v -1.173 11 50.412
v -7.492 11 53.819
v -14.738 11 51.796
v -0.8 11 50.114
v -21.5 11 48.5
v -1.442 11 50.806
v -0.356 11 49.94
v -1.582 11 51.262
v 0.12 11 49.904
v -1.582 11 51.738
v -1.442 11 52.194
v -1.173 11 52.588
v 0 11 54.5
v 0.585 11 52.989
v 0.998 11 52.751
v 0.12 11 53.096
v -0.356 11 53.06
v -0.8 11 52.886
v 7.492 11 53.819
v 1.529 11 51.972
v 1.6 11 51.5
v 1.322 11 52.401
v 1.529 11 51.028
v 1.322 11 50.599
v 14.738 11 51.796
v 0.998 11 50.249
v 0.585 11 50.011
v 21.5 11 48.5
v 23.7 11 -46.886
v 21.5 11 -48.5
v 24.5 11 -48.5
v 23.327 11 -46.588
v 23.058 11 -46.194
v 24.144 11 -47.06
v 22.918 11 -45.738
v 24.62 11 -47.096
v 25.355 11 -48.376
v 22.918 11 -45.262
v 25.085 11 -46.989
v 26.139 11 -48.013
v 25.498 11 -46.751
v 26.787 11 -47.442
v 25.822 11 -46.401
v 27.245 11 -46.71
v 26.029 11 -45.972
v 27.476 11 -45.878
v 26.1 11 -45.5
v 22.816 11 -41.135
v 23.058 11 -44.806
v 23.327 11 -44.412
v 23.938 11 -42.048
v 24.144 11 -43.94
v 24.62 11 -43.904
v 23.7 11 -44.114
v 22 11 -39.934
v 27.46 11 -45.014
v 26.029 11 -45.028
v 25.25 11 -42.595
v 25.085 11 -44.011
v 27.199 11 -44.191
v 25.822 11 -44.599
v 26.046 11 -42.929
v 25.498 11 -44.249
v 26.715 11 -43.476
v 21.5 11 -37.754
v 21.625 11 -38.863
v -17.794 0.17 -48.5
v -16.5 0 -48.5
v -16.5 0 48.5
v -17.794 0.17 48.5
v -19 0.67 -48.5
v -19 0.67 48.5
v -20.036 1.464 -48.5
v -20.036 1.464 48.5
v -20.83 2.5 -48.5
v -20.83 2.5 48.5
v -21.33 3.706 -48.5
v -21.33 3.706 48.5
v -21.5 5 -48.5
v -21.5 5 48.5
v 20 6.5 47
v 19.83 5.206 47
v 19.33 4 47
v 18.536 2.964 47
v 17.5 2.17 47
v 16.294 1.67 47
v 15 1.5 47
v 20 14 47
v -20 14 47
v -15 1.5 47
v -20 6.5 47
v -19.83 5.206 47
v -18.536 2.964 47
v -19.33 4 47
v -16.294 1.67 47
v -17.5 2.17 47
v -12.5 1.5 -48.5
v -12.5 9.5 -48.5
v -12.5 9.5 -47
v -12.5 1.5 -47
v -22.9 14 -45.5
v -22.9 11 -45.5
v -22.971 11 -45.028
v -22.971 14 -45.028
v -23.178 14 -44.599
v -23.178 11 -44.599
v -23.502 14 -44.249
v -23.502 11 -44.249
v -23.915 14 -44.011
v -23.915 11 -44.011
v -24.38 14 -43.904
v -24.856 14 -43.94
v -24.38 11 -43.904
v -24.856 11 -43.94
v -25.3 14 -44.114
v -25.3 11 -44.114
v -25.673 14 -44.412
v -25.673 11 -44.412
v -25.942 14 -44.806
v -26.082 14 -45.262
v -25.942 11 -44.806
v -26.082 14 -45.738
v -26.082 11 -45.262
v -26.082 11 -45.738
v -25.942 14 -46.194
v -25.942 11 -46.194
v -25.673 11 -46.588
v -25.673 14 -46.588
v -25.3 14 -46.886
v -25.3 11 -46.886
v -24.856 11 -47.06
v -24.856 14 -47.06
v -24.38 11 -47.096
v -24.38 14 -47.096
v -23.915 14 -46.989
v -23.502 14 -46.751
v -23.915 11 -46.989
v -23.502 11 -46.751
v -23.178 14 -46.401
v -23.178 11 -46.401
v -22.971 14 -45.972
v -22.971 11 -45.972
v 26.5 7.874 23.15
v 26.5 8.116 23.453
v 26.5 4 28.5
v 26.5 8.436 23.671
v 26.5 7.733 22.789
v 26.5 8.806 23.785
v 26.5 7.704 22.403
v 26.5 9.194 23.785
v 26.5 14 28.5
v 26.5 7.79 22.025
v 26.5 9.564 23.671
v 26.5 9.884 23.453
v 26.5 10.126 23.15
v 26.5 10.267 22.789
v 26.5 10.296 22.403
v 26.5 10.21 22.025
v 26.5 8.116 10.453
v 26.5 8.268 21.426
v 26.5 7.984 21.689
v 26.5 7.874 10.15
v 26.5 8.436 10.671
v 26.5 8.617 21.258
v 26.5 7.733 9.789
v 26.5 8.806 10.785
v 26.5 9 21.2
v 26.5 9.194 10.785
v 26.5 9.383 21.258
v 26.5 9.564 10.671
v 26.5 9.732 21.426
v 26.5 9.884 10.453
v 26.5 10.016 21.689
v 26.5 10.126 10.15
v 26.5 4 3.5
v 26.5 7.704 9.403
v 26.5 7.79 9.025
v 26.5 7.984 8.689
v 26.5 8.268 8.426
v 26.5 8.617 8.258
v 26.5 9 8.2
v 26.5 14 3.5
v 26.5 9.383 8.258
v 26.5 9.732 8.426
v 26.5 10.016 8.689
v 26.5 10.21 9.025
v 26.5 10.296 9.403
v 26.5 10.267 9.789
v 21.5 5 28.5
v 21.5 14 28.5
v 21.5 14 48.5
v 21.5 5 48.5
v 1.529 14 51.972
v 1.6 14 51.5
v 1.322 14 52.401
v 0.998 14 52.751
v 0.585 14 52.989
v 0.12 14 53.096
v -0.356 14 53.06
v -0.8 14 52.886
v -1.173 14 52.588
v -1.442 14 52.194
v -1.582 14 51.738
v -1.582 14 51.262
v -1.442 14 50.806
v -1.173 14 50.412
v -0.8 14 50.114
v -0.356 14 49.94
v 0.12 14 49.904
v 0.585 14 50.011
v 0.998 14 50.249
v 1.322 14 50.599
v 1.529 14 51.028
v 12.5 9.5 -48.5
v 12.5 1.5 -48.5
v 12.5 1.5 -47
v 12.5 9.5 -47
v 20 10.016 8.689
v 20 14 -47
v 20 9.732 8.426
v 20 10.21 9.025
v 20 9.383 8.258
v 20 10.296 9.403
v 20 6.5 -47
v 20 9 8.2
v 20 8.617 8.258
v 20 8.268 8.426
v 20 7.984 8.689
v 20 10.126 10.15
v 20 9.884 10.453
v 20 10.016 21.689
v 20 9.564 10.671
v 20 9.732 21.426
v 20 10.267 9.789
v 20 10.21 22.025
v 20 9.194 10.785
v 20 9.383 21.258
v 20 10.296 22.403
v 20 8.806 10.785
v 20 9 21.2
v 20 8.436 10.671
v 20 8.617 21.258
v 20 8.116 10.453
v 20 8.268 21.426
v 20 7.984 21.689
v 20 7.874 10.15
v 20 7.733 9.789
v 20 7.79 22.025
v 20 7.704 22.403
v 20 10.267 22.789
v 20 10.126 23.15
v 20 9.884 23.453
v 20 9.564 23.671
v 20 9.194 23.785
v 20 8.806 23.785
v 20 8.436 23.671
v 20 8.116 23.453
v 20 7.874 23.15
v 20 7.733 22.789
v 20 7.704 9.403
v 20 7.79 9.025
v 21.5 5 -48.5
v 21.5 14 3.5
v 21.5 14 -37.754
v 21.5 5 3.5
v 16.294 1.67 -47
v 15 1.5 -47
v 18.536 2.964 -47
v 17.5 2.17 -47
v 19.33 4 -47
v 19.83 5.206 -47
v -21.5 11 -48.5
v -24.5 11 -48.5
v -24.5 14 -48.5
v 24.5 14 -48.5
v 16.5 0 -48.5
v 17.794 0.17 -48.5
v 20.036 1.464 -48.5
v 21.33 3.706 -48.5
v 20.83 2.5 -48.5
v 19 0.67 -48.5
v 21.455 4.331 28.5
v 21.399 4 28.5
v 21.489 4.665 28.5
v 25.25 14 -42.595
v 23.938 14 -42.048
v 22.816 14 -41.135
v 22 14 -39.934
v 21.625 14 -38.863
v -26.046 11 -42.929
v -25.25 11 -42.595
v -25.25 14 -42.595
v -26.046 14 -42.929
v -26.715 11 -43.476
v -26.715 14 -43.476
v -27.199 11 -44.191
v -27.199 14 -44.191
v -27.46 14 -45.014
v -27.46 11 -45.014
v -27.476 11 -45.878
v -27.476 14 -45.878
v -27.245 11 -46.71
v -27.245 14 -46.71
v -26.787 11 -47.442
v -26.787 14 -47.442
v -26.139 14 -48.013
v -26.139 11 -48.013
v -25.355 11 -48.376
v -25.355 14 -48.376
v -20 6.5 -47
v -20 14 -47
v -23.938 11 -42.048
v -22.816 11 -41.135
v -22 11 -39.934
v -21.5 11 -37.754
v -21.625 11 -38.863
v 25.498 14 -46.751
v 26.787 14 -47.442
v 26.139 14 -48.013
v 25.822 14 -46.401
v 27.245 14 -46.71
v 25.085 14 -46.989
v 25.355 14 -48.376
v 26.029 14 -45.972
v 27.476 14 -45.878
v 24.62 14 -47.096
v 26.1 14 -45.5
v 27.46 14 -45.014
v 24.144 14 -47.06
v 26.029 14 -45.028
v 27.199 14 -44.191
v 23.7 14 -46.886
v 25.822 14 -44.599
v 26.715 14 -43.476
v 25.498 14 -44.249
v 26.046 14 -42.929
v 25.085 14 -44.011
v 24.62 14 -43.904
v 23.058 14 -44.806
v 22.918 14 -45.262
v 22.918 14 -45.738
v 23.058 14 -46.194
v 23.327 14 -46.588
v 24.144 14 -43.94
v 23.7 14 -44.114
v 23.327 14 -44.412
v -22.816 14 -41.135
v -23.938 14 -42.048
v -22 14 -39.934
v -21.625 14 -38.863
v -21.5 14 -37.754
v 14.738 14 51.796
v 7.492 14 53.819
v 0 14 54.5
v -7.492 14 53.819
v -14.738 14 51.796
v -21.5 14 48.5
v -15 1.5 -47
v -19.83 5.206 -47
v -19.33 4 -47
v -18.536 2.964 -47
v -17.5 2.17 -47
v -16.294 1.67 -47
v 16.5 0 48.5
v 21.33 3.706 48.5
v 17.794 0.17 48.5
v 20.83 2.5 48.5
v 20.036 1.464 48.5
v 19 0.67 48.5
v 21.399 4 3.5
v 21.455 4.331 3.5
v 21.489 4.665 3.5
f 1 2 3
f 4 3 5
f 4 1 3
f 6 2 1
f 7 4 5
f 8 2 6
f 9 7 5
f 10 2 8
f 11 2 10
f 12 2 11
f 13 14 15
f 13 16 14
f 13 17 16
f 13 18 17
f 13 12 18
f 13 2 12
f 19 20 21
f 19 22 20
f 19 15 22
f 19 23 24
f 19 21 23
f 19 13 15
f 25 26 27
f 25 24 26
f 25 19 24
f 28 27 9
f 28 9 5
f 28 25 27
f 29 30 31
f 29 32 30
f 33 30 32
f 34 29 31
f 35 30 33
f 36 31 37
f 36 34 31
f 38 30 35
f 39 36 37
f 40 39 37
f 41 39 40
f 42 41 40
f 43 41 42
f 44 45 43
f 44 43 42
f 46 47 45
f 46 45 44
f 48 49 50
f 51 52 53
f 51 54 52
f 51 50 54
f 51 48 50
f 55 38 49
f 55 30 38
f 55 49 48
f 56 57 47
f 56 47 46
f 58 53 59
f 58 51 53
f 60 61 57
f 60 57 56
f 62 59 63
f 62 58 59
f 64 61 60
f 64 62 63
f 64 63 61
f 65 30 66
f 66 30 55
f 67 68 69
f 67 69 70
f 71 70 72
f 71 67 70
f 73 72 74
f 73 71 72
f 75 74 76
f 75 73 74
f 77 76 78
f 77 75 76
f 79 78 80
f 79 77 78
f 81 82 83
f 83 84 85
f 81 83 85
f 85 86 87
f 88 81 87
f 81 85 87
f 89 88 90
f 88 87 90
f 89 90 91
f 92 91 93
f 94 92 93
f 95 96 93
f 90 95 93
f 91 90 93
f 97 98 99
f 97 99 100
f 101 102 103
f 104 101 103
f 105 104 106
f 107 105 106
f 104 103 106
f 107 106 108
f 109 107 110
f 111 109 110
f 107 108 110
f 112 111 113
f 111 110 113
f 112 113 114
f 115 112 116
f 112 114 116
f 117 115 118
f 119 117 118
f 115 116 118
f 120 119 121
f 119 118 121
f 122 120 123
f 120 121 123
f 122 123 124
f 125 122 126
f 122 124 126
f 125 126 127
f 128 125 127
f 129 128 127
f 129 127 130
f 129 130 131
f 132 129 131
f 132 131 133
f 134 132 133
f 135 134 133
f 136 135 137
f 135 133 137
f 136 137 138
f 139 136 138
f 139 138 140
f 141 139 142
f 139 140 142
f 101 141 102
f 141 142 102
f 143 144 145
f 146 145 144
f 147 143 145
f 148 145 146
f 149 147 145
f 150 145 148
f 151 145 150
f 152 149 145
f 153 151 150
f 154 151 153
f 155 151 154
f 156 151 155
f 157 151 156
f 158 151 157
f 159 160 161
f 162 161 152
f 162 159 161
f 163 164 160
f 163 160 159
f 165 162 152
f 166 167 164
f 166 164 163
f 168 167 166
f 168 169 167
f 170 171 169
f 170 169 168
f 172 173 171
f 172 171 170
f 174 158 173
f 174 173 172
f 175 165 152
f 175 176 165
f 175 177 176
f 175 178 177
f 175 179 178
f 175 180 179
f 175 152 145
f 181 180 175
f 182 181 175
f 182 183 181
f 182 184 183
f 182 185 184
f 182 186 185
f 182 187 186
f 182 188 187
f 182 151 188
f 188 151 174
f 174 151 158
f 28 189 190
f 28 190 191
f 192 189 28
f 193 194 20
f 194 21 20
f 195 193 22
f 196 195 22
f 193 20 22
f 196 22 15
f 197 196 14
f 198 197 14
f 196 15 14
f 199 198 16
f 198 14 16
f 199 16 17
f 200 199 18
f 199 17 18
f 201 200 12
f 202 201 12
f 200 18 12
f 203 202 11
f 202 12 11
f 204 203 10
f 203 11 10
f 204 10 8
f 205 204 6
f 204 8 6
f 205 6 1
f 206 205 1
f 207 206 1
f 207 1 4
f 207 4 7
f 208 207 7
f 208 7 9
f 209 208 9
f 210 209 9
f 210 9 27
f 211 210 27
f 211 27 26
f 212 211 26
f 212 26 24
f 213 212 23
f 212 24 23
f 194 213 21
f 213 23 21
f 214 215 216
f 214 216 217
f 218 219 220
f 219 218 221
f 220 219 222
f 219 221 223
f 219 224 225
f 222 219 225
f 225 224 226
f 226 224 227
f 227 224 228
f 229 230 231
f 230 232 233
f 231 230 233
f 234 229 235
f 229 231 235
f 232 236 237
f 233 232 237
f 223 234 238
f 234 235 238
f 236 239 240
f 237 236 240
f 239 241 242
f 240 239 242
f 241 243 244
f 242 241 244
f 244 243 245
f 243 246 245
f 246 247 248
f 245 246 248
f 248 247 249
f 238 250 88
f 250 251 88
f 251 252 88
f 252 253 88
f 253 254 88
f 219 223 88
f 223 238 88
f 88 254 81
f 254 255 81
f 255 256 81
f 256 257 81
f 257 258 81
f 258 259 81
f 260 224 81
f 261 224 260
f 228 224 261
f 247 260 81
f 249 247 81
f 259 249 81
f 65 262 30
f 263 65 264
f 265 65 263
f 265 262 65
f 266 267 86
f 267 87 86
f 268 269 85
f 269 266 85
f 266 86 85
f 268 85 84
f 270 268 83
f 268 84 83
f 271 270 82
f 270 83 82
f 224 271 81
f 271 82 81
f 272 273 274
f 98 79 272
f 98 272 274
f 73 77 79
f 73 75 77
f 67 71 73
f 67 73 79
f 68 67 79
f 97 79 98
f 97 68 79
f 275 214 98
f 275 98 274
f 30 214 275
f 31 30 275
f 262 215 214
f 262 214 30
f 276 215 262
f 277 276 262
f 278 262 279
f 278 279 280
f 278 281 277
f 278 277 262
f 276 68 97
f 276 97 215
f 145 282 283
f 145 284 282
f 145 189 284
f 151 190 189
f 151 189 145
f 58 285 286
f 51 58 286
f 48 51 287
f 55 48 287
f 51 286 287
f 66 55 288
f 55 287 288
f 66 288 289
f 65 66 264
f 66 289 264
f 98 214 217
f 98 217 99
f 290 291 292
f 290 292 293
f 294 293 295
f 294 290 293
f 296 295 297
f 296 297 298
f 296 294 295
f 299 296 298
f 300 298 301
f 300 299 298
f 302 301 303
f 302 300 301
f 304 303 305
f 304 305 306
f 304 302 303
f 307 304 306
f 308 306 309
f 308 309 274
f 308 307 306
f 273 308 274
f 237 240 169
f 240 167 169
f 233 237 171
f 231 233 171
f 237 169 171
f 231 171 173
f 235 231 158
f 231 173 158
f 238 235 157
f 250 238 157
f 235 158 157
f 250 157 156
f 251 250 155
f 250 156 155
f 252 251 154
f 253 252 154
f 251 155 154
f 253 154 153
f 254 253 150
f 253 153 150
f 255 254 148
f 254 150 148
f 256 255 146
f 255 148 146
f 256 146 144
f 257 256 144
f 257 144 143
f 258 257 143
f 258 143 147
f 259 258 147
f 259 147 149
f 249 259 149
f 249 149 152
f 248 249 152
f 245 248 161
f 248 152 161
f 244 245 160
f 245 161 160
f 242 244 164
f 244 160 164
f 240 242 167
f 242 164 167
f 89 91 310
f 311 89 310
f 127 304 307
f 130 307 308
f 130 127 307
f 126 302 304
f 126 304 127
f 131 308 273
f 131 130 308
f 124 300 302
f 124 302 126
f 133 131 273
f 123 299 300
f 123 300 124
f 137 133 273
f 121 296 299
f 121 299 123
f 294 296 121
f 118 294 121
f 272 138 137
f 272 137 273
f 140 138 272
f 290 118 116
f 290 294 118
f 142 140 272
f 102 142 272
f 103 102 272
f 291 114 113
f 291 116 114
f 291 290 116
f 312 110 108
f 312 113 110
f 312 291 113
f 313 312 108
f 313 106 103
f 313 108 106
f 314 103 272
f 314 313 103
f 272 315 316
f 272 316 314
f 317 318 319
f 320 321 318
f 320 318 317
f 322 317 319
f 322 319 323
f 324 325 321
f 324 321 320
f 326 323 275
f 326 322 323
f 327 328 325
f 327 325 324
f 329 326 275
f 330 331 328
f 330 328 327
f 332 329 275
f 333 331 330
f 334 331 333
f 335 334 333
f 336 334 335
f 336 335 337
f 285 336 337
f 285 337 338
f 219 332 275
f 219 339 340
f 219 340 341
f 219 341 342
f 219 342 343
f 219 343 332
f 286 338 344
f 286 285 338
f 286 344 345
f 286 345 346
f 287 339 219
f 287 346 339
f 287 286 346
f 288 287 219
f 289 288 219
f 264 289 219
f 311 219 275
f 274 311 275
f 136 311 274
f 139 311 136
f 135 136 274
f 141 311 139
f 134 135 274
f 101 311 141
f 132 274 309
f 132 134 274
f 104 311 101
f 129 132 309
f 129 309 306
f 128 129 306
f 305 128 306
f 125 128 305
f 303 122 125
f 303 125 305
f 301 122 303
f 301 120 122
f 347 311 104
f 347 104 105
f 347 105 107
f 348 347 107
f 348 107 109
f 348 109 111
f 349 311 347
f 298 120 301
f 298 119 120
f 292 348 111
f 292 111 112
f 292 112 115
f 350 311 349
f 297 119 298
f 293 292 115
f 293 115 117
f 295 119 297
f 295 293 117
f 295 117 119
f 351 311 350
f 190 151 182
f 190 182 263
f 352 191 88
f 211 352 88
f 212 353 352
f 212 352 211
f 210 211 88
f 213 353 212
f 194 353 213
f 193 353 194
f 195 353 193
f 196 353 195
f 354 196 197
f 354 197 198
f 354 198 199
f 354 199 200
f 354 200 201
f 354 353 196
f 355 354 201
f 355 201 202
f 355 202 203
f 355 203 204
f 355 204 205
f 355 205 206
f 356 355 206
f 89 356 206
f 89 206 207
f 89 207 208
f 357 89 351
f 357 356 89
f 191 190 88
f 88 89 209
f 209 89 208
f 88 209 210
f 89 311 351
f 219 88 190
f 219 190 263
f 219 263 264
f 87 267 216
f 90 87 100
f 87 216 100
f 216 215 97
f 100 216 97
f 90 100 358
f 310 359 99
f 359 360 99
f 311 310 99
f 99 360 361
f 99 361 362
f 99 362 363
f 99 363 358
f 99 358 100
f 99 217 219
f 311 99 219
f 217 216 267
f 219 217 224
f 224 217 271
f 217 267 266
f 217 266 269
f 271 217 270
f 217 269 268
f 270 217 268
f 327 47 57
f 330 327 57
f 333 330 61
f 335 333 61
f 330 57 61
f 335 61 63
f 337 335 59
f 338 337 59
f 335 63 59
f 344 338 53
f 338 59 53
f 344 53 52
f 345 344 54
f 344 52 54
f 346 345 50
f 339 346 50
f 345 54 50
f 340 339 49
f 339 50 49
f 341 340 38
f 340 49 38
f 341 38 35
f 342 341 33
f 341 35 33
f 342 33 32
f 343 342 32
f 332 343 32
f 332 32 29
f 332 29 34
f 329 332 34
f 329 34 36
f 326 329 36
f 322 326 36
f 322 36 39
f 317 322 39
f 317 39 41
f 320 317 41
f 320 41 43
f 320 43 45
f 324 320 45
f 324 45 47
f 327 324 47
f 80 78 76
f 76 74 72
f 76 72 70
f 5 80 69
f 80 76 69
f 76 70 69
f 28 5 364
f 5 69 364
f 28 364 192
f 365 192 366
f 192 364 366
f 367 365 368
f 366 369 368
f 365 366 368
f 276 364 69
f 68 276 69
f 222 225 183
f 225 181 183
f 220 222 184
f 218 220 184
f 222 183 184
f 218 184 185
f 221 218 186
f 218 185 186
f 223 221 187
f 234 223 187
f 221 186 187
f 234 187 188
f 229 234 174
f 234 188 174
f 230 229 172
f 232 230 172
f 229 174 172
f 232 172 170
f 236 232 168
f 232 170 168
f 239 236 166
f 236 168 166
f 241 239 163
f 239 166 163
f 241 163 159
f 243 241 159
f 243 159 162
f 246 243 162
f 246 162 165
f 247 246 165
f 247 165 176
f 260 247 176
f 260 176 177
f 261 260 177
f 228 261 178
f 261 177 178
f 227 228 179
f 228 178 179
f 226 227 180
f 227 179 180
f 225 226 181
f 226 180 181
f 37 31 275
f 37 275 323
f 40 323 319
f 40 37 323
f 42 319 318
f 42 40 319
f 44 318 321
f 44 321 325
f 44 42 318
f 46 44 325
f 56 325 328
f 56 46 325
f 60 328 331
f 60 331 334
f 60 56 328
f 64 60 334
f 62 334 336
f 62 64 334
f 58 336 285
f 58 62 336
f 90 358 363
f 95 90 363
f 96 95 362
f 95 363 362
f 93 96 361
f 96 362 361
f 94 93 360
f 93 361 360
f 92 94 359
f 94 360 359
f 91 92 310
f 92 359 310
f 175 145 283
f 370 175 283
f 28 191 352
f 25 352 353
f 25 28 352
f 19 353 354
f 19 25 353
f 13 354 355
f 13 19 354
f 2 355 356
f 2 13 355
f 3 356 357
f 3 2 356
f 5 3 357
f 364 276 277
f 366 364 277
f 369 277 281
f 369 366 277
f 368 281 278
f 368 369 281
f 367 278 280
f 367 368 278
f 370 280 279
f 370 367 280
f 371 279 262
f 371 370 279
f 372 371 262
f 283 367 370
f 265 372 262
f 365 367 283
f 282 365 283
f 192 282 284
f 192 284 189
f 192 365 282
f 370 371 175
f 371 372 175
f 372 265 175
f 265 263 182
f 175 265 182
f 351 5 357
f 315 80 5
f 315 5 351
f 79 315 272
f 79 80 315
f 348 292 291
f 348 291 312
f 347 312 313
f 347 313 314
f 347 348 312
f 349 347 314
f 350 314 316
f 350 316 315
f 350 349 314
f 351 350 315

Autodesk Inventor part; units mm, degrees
ref_plane "YZ Plane" through (0, 0, 0) normal (1, 0, 0) x (0, 1, 0)
ref_plane "XZ Plane" through (0, 0, 0) normal (0, 1, 0) x (-1, 0, 0)
sketch "スケッチ1" plane through (0, 0, 0) normal (0, 1, 0) x (-1, 0, 0)
  line L0 (21.5, -48.5) -> (-21.5, -48.5)
  line L1 (-21.5, -48.5) -> (-21.5, 48.5)
  line L2 (-21.5, 48.5) -> (21.5, 48.5)
  line L3 (21.5, 48.5) -> (21.5, -48.5)
  line L4 (21.5, -48.5) -> (-21.5, 48.5) construction
  line L5 (-21.5, -48.5) -> (21.5, 48.5) construction
  point P0 (0, 0)
  dimension "d0" = 43
  dimension "d1" = 97
extrude "押し出し1" add sketch "スケッチ1" along normal blind 14
shell "シェル1" thickness 1.5 removed faces 1 at (-7.1667, 14, -16.1667)
fillet "フィレット1" radius 5 4 edges at (-21.5, 0, 0) (21.5, 0, 0) (-20, 1.5, 0) (20, 1.5, 0)
sketch "スケッチ2" plane through (21.5, 14, -48.5) normal (0, 0, -1) x (-1, 0, 0)
  arc A0 (1.5, -7.5) -> (6.5, -12.5) centre (6.5, -7.5) ccw projected
  line L0 (1.5, -7.5) -> (1.5, 0) projected
  line L1 (41.5, 0) -> (1.5, 0) projected
  line L2 (41.5, -7.5) -> (41.5, 0) projected
  arc A1 (36.5, -12.5) -> (41.5, -7.5) centre (36.5, -7.5) ccw projected
  line L3 (6.5, -12.5) -> (36.5, -12.5) projected
  line L4 (1.5, -4.5) -> (41.5, -4.5)
  line L5 (9, -4.5) -> (34, -4.5)
  line L6 (34, -4.5) -> (34, -12.5)
  line L7 (34, -12.5) -> (9, -12.5)
  line L8 (9, -12.5) -> (9, -4.5)
  point P0 (21.5, -14)
  point P1 (21.5, -4.5)
  point P2 (9, -12.5)
  dimension "d8" = 8
  dimension "d9" = 25
extrude "押し出し2" cut sketch "スケッチ2" against normal up to surface (1.5 mm away) contours L8 L4 L6 L3
sketch "スケッチ3" plane through (0, 0, 0) normal (0, -1, 0) x (1, 0, 0)
  circle A0 centre (0, 51.5) radius 3
  circle A1 centre (24.5, -45.5) radius 3
  circle A2 centre (-24.5, -45.5) radius 3
  line L0 (-21.5, 48.5) -> (-21.5, -48.5) projected
  line L1 (16.5, -48.5) -> (-16.5, -48.5) projected
  line L2 (21.5, -48.5) -> (21.5, 48.5) projected
  line L3 (-16.5, 48.5) -> (16.5, 48.5) projected
  line L4 (-24.5, -48.5) -> (24.5, -48.5)
  arc A3 (21.5, 48.5) -> (-21.5, 48.5) centre (0, 12.9792) ccw
  line L5 (-21.5, 48.5) -> (-16.5, 48.5) projected
  line L6 (16.5, 48.5) -> (21.5, 48.5) projected
  circle A4 centre (0, 51.5) radius 1.6
  circle A5 centre (24.5, -45.5) radius 1.6
  circle A6 centre (-24.5, -45.5) radius 1.6
  point P0 (0, 0)
  point P1 (-21.5, -45.5)
  point P2 (21.5, -45.5)
  dimension "d11" = 6
  dimension "d12" = 6
  dimension "d10" = 6
  dimension "d13" = 3.2
  dimension "d14" = 3.2
  dimension "d15" = 3.2
extrude "押し出し3" add sketch "スケッチ3" against normal up to surface (14 mm away) contours A0 | A0 A3 L6 L3 | A0 L3 L5 A3 | A1 | A1 L4 L2 | A2 | L0 L4 A2
extrude "押し出し4" cut sketch "スケッチ3" against normal blind 11 contours A0 | A0 A3 L6 L3 | A0 L3 L5 A3 | A1 | A1 L4 L2 | A2 | L0 L4 A2 | A4 | A6
fillet "フィレット2" radius 5 2 edges at (-21.5, 12.5, -45.5) (21.5, 12.5, -45.5)
sketch "スケッチ4" plane through (21.5, 5, 48.5) normal (1, 0, 0) x (0, 0, -1)
  line L0 (20, 9) -> (45, 9)
  line L1 (45, 9) -> (45, -1)
  line L2 (45, -1) -> (20, -1)
  line L3 (20, -1) -> (20, 9)
  line L4 (0, 9) -> (86.254, 9) projected
  line L5 (0, 0) -> (0, 6) projected
  point P0 (48.5, -5)
  dimension "d21" = 25
  dimension "d22" = 10
  dimension "d23" = 20
extrude "押し出し5" add sketch "スケッチ4" along normal blind 5
sketch "スケッチ5" plane through (26.5, 5, 48.5) normal (1, 0, 0) x (0, 0, -1)
  circle A0 centre (26, 4) radius 1.3
  circle A1 centre (39, 4) radius 1.3
  line L0 (20, 9) -> (20, -1) projected
  line L1 (45, -1) -> (45, 9) projected
  point P0 (48.5, -5)
  point P1 (20, 4)
  dimension "d26" = 2.6
  dimension "d27" = 2.6
  dimension "d28" = 6
  dimension "d29" = 6
ref_plane "作業平面1" through (18.75, 8.39, -7.25) normal (1, 0, 0) x (0, 1, 0)
extrude "押し出し6" cut sketch "スケッチ5" against normal up to surface (7.75 mm away)
sketch "スケッチ6" plane through (21.5, 4, 28.5) normal (0, 0, 1) x (1, 0, 0)
  arc A0 (-5, -4) -> (0, 1) centre (-5, 1) ccw projected
  line L0 (0, 0) -> (5, 0) projected
  line L1 (0, 1) -> (0, 0) projected
  line L2 (0, 0) -> (-0.101, 0)
  point P0 (-21.5, -4)
extrude "押し出し7" add sketch "スケッチ6" against normal up to surface (25 mm away)
properties part number "handle_monitor_case_under"
